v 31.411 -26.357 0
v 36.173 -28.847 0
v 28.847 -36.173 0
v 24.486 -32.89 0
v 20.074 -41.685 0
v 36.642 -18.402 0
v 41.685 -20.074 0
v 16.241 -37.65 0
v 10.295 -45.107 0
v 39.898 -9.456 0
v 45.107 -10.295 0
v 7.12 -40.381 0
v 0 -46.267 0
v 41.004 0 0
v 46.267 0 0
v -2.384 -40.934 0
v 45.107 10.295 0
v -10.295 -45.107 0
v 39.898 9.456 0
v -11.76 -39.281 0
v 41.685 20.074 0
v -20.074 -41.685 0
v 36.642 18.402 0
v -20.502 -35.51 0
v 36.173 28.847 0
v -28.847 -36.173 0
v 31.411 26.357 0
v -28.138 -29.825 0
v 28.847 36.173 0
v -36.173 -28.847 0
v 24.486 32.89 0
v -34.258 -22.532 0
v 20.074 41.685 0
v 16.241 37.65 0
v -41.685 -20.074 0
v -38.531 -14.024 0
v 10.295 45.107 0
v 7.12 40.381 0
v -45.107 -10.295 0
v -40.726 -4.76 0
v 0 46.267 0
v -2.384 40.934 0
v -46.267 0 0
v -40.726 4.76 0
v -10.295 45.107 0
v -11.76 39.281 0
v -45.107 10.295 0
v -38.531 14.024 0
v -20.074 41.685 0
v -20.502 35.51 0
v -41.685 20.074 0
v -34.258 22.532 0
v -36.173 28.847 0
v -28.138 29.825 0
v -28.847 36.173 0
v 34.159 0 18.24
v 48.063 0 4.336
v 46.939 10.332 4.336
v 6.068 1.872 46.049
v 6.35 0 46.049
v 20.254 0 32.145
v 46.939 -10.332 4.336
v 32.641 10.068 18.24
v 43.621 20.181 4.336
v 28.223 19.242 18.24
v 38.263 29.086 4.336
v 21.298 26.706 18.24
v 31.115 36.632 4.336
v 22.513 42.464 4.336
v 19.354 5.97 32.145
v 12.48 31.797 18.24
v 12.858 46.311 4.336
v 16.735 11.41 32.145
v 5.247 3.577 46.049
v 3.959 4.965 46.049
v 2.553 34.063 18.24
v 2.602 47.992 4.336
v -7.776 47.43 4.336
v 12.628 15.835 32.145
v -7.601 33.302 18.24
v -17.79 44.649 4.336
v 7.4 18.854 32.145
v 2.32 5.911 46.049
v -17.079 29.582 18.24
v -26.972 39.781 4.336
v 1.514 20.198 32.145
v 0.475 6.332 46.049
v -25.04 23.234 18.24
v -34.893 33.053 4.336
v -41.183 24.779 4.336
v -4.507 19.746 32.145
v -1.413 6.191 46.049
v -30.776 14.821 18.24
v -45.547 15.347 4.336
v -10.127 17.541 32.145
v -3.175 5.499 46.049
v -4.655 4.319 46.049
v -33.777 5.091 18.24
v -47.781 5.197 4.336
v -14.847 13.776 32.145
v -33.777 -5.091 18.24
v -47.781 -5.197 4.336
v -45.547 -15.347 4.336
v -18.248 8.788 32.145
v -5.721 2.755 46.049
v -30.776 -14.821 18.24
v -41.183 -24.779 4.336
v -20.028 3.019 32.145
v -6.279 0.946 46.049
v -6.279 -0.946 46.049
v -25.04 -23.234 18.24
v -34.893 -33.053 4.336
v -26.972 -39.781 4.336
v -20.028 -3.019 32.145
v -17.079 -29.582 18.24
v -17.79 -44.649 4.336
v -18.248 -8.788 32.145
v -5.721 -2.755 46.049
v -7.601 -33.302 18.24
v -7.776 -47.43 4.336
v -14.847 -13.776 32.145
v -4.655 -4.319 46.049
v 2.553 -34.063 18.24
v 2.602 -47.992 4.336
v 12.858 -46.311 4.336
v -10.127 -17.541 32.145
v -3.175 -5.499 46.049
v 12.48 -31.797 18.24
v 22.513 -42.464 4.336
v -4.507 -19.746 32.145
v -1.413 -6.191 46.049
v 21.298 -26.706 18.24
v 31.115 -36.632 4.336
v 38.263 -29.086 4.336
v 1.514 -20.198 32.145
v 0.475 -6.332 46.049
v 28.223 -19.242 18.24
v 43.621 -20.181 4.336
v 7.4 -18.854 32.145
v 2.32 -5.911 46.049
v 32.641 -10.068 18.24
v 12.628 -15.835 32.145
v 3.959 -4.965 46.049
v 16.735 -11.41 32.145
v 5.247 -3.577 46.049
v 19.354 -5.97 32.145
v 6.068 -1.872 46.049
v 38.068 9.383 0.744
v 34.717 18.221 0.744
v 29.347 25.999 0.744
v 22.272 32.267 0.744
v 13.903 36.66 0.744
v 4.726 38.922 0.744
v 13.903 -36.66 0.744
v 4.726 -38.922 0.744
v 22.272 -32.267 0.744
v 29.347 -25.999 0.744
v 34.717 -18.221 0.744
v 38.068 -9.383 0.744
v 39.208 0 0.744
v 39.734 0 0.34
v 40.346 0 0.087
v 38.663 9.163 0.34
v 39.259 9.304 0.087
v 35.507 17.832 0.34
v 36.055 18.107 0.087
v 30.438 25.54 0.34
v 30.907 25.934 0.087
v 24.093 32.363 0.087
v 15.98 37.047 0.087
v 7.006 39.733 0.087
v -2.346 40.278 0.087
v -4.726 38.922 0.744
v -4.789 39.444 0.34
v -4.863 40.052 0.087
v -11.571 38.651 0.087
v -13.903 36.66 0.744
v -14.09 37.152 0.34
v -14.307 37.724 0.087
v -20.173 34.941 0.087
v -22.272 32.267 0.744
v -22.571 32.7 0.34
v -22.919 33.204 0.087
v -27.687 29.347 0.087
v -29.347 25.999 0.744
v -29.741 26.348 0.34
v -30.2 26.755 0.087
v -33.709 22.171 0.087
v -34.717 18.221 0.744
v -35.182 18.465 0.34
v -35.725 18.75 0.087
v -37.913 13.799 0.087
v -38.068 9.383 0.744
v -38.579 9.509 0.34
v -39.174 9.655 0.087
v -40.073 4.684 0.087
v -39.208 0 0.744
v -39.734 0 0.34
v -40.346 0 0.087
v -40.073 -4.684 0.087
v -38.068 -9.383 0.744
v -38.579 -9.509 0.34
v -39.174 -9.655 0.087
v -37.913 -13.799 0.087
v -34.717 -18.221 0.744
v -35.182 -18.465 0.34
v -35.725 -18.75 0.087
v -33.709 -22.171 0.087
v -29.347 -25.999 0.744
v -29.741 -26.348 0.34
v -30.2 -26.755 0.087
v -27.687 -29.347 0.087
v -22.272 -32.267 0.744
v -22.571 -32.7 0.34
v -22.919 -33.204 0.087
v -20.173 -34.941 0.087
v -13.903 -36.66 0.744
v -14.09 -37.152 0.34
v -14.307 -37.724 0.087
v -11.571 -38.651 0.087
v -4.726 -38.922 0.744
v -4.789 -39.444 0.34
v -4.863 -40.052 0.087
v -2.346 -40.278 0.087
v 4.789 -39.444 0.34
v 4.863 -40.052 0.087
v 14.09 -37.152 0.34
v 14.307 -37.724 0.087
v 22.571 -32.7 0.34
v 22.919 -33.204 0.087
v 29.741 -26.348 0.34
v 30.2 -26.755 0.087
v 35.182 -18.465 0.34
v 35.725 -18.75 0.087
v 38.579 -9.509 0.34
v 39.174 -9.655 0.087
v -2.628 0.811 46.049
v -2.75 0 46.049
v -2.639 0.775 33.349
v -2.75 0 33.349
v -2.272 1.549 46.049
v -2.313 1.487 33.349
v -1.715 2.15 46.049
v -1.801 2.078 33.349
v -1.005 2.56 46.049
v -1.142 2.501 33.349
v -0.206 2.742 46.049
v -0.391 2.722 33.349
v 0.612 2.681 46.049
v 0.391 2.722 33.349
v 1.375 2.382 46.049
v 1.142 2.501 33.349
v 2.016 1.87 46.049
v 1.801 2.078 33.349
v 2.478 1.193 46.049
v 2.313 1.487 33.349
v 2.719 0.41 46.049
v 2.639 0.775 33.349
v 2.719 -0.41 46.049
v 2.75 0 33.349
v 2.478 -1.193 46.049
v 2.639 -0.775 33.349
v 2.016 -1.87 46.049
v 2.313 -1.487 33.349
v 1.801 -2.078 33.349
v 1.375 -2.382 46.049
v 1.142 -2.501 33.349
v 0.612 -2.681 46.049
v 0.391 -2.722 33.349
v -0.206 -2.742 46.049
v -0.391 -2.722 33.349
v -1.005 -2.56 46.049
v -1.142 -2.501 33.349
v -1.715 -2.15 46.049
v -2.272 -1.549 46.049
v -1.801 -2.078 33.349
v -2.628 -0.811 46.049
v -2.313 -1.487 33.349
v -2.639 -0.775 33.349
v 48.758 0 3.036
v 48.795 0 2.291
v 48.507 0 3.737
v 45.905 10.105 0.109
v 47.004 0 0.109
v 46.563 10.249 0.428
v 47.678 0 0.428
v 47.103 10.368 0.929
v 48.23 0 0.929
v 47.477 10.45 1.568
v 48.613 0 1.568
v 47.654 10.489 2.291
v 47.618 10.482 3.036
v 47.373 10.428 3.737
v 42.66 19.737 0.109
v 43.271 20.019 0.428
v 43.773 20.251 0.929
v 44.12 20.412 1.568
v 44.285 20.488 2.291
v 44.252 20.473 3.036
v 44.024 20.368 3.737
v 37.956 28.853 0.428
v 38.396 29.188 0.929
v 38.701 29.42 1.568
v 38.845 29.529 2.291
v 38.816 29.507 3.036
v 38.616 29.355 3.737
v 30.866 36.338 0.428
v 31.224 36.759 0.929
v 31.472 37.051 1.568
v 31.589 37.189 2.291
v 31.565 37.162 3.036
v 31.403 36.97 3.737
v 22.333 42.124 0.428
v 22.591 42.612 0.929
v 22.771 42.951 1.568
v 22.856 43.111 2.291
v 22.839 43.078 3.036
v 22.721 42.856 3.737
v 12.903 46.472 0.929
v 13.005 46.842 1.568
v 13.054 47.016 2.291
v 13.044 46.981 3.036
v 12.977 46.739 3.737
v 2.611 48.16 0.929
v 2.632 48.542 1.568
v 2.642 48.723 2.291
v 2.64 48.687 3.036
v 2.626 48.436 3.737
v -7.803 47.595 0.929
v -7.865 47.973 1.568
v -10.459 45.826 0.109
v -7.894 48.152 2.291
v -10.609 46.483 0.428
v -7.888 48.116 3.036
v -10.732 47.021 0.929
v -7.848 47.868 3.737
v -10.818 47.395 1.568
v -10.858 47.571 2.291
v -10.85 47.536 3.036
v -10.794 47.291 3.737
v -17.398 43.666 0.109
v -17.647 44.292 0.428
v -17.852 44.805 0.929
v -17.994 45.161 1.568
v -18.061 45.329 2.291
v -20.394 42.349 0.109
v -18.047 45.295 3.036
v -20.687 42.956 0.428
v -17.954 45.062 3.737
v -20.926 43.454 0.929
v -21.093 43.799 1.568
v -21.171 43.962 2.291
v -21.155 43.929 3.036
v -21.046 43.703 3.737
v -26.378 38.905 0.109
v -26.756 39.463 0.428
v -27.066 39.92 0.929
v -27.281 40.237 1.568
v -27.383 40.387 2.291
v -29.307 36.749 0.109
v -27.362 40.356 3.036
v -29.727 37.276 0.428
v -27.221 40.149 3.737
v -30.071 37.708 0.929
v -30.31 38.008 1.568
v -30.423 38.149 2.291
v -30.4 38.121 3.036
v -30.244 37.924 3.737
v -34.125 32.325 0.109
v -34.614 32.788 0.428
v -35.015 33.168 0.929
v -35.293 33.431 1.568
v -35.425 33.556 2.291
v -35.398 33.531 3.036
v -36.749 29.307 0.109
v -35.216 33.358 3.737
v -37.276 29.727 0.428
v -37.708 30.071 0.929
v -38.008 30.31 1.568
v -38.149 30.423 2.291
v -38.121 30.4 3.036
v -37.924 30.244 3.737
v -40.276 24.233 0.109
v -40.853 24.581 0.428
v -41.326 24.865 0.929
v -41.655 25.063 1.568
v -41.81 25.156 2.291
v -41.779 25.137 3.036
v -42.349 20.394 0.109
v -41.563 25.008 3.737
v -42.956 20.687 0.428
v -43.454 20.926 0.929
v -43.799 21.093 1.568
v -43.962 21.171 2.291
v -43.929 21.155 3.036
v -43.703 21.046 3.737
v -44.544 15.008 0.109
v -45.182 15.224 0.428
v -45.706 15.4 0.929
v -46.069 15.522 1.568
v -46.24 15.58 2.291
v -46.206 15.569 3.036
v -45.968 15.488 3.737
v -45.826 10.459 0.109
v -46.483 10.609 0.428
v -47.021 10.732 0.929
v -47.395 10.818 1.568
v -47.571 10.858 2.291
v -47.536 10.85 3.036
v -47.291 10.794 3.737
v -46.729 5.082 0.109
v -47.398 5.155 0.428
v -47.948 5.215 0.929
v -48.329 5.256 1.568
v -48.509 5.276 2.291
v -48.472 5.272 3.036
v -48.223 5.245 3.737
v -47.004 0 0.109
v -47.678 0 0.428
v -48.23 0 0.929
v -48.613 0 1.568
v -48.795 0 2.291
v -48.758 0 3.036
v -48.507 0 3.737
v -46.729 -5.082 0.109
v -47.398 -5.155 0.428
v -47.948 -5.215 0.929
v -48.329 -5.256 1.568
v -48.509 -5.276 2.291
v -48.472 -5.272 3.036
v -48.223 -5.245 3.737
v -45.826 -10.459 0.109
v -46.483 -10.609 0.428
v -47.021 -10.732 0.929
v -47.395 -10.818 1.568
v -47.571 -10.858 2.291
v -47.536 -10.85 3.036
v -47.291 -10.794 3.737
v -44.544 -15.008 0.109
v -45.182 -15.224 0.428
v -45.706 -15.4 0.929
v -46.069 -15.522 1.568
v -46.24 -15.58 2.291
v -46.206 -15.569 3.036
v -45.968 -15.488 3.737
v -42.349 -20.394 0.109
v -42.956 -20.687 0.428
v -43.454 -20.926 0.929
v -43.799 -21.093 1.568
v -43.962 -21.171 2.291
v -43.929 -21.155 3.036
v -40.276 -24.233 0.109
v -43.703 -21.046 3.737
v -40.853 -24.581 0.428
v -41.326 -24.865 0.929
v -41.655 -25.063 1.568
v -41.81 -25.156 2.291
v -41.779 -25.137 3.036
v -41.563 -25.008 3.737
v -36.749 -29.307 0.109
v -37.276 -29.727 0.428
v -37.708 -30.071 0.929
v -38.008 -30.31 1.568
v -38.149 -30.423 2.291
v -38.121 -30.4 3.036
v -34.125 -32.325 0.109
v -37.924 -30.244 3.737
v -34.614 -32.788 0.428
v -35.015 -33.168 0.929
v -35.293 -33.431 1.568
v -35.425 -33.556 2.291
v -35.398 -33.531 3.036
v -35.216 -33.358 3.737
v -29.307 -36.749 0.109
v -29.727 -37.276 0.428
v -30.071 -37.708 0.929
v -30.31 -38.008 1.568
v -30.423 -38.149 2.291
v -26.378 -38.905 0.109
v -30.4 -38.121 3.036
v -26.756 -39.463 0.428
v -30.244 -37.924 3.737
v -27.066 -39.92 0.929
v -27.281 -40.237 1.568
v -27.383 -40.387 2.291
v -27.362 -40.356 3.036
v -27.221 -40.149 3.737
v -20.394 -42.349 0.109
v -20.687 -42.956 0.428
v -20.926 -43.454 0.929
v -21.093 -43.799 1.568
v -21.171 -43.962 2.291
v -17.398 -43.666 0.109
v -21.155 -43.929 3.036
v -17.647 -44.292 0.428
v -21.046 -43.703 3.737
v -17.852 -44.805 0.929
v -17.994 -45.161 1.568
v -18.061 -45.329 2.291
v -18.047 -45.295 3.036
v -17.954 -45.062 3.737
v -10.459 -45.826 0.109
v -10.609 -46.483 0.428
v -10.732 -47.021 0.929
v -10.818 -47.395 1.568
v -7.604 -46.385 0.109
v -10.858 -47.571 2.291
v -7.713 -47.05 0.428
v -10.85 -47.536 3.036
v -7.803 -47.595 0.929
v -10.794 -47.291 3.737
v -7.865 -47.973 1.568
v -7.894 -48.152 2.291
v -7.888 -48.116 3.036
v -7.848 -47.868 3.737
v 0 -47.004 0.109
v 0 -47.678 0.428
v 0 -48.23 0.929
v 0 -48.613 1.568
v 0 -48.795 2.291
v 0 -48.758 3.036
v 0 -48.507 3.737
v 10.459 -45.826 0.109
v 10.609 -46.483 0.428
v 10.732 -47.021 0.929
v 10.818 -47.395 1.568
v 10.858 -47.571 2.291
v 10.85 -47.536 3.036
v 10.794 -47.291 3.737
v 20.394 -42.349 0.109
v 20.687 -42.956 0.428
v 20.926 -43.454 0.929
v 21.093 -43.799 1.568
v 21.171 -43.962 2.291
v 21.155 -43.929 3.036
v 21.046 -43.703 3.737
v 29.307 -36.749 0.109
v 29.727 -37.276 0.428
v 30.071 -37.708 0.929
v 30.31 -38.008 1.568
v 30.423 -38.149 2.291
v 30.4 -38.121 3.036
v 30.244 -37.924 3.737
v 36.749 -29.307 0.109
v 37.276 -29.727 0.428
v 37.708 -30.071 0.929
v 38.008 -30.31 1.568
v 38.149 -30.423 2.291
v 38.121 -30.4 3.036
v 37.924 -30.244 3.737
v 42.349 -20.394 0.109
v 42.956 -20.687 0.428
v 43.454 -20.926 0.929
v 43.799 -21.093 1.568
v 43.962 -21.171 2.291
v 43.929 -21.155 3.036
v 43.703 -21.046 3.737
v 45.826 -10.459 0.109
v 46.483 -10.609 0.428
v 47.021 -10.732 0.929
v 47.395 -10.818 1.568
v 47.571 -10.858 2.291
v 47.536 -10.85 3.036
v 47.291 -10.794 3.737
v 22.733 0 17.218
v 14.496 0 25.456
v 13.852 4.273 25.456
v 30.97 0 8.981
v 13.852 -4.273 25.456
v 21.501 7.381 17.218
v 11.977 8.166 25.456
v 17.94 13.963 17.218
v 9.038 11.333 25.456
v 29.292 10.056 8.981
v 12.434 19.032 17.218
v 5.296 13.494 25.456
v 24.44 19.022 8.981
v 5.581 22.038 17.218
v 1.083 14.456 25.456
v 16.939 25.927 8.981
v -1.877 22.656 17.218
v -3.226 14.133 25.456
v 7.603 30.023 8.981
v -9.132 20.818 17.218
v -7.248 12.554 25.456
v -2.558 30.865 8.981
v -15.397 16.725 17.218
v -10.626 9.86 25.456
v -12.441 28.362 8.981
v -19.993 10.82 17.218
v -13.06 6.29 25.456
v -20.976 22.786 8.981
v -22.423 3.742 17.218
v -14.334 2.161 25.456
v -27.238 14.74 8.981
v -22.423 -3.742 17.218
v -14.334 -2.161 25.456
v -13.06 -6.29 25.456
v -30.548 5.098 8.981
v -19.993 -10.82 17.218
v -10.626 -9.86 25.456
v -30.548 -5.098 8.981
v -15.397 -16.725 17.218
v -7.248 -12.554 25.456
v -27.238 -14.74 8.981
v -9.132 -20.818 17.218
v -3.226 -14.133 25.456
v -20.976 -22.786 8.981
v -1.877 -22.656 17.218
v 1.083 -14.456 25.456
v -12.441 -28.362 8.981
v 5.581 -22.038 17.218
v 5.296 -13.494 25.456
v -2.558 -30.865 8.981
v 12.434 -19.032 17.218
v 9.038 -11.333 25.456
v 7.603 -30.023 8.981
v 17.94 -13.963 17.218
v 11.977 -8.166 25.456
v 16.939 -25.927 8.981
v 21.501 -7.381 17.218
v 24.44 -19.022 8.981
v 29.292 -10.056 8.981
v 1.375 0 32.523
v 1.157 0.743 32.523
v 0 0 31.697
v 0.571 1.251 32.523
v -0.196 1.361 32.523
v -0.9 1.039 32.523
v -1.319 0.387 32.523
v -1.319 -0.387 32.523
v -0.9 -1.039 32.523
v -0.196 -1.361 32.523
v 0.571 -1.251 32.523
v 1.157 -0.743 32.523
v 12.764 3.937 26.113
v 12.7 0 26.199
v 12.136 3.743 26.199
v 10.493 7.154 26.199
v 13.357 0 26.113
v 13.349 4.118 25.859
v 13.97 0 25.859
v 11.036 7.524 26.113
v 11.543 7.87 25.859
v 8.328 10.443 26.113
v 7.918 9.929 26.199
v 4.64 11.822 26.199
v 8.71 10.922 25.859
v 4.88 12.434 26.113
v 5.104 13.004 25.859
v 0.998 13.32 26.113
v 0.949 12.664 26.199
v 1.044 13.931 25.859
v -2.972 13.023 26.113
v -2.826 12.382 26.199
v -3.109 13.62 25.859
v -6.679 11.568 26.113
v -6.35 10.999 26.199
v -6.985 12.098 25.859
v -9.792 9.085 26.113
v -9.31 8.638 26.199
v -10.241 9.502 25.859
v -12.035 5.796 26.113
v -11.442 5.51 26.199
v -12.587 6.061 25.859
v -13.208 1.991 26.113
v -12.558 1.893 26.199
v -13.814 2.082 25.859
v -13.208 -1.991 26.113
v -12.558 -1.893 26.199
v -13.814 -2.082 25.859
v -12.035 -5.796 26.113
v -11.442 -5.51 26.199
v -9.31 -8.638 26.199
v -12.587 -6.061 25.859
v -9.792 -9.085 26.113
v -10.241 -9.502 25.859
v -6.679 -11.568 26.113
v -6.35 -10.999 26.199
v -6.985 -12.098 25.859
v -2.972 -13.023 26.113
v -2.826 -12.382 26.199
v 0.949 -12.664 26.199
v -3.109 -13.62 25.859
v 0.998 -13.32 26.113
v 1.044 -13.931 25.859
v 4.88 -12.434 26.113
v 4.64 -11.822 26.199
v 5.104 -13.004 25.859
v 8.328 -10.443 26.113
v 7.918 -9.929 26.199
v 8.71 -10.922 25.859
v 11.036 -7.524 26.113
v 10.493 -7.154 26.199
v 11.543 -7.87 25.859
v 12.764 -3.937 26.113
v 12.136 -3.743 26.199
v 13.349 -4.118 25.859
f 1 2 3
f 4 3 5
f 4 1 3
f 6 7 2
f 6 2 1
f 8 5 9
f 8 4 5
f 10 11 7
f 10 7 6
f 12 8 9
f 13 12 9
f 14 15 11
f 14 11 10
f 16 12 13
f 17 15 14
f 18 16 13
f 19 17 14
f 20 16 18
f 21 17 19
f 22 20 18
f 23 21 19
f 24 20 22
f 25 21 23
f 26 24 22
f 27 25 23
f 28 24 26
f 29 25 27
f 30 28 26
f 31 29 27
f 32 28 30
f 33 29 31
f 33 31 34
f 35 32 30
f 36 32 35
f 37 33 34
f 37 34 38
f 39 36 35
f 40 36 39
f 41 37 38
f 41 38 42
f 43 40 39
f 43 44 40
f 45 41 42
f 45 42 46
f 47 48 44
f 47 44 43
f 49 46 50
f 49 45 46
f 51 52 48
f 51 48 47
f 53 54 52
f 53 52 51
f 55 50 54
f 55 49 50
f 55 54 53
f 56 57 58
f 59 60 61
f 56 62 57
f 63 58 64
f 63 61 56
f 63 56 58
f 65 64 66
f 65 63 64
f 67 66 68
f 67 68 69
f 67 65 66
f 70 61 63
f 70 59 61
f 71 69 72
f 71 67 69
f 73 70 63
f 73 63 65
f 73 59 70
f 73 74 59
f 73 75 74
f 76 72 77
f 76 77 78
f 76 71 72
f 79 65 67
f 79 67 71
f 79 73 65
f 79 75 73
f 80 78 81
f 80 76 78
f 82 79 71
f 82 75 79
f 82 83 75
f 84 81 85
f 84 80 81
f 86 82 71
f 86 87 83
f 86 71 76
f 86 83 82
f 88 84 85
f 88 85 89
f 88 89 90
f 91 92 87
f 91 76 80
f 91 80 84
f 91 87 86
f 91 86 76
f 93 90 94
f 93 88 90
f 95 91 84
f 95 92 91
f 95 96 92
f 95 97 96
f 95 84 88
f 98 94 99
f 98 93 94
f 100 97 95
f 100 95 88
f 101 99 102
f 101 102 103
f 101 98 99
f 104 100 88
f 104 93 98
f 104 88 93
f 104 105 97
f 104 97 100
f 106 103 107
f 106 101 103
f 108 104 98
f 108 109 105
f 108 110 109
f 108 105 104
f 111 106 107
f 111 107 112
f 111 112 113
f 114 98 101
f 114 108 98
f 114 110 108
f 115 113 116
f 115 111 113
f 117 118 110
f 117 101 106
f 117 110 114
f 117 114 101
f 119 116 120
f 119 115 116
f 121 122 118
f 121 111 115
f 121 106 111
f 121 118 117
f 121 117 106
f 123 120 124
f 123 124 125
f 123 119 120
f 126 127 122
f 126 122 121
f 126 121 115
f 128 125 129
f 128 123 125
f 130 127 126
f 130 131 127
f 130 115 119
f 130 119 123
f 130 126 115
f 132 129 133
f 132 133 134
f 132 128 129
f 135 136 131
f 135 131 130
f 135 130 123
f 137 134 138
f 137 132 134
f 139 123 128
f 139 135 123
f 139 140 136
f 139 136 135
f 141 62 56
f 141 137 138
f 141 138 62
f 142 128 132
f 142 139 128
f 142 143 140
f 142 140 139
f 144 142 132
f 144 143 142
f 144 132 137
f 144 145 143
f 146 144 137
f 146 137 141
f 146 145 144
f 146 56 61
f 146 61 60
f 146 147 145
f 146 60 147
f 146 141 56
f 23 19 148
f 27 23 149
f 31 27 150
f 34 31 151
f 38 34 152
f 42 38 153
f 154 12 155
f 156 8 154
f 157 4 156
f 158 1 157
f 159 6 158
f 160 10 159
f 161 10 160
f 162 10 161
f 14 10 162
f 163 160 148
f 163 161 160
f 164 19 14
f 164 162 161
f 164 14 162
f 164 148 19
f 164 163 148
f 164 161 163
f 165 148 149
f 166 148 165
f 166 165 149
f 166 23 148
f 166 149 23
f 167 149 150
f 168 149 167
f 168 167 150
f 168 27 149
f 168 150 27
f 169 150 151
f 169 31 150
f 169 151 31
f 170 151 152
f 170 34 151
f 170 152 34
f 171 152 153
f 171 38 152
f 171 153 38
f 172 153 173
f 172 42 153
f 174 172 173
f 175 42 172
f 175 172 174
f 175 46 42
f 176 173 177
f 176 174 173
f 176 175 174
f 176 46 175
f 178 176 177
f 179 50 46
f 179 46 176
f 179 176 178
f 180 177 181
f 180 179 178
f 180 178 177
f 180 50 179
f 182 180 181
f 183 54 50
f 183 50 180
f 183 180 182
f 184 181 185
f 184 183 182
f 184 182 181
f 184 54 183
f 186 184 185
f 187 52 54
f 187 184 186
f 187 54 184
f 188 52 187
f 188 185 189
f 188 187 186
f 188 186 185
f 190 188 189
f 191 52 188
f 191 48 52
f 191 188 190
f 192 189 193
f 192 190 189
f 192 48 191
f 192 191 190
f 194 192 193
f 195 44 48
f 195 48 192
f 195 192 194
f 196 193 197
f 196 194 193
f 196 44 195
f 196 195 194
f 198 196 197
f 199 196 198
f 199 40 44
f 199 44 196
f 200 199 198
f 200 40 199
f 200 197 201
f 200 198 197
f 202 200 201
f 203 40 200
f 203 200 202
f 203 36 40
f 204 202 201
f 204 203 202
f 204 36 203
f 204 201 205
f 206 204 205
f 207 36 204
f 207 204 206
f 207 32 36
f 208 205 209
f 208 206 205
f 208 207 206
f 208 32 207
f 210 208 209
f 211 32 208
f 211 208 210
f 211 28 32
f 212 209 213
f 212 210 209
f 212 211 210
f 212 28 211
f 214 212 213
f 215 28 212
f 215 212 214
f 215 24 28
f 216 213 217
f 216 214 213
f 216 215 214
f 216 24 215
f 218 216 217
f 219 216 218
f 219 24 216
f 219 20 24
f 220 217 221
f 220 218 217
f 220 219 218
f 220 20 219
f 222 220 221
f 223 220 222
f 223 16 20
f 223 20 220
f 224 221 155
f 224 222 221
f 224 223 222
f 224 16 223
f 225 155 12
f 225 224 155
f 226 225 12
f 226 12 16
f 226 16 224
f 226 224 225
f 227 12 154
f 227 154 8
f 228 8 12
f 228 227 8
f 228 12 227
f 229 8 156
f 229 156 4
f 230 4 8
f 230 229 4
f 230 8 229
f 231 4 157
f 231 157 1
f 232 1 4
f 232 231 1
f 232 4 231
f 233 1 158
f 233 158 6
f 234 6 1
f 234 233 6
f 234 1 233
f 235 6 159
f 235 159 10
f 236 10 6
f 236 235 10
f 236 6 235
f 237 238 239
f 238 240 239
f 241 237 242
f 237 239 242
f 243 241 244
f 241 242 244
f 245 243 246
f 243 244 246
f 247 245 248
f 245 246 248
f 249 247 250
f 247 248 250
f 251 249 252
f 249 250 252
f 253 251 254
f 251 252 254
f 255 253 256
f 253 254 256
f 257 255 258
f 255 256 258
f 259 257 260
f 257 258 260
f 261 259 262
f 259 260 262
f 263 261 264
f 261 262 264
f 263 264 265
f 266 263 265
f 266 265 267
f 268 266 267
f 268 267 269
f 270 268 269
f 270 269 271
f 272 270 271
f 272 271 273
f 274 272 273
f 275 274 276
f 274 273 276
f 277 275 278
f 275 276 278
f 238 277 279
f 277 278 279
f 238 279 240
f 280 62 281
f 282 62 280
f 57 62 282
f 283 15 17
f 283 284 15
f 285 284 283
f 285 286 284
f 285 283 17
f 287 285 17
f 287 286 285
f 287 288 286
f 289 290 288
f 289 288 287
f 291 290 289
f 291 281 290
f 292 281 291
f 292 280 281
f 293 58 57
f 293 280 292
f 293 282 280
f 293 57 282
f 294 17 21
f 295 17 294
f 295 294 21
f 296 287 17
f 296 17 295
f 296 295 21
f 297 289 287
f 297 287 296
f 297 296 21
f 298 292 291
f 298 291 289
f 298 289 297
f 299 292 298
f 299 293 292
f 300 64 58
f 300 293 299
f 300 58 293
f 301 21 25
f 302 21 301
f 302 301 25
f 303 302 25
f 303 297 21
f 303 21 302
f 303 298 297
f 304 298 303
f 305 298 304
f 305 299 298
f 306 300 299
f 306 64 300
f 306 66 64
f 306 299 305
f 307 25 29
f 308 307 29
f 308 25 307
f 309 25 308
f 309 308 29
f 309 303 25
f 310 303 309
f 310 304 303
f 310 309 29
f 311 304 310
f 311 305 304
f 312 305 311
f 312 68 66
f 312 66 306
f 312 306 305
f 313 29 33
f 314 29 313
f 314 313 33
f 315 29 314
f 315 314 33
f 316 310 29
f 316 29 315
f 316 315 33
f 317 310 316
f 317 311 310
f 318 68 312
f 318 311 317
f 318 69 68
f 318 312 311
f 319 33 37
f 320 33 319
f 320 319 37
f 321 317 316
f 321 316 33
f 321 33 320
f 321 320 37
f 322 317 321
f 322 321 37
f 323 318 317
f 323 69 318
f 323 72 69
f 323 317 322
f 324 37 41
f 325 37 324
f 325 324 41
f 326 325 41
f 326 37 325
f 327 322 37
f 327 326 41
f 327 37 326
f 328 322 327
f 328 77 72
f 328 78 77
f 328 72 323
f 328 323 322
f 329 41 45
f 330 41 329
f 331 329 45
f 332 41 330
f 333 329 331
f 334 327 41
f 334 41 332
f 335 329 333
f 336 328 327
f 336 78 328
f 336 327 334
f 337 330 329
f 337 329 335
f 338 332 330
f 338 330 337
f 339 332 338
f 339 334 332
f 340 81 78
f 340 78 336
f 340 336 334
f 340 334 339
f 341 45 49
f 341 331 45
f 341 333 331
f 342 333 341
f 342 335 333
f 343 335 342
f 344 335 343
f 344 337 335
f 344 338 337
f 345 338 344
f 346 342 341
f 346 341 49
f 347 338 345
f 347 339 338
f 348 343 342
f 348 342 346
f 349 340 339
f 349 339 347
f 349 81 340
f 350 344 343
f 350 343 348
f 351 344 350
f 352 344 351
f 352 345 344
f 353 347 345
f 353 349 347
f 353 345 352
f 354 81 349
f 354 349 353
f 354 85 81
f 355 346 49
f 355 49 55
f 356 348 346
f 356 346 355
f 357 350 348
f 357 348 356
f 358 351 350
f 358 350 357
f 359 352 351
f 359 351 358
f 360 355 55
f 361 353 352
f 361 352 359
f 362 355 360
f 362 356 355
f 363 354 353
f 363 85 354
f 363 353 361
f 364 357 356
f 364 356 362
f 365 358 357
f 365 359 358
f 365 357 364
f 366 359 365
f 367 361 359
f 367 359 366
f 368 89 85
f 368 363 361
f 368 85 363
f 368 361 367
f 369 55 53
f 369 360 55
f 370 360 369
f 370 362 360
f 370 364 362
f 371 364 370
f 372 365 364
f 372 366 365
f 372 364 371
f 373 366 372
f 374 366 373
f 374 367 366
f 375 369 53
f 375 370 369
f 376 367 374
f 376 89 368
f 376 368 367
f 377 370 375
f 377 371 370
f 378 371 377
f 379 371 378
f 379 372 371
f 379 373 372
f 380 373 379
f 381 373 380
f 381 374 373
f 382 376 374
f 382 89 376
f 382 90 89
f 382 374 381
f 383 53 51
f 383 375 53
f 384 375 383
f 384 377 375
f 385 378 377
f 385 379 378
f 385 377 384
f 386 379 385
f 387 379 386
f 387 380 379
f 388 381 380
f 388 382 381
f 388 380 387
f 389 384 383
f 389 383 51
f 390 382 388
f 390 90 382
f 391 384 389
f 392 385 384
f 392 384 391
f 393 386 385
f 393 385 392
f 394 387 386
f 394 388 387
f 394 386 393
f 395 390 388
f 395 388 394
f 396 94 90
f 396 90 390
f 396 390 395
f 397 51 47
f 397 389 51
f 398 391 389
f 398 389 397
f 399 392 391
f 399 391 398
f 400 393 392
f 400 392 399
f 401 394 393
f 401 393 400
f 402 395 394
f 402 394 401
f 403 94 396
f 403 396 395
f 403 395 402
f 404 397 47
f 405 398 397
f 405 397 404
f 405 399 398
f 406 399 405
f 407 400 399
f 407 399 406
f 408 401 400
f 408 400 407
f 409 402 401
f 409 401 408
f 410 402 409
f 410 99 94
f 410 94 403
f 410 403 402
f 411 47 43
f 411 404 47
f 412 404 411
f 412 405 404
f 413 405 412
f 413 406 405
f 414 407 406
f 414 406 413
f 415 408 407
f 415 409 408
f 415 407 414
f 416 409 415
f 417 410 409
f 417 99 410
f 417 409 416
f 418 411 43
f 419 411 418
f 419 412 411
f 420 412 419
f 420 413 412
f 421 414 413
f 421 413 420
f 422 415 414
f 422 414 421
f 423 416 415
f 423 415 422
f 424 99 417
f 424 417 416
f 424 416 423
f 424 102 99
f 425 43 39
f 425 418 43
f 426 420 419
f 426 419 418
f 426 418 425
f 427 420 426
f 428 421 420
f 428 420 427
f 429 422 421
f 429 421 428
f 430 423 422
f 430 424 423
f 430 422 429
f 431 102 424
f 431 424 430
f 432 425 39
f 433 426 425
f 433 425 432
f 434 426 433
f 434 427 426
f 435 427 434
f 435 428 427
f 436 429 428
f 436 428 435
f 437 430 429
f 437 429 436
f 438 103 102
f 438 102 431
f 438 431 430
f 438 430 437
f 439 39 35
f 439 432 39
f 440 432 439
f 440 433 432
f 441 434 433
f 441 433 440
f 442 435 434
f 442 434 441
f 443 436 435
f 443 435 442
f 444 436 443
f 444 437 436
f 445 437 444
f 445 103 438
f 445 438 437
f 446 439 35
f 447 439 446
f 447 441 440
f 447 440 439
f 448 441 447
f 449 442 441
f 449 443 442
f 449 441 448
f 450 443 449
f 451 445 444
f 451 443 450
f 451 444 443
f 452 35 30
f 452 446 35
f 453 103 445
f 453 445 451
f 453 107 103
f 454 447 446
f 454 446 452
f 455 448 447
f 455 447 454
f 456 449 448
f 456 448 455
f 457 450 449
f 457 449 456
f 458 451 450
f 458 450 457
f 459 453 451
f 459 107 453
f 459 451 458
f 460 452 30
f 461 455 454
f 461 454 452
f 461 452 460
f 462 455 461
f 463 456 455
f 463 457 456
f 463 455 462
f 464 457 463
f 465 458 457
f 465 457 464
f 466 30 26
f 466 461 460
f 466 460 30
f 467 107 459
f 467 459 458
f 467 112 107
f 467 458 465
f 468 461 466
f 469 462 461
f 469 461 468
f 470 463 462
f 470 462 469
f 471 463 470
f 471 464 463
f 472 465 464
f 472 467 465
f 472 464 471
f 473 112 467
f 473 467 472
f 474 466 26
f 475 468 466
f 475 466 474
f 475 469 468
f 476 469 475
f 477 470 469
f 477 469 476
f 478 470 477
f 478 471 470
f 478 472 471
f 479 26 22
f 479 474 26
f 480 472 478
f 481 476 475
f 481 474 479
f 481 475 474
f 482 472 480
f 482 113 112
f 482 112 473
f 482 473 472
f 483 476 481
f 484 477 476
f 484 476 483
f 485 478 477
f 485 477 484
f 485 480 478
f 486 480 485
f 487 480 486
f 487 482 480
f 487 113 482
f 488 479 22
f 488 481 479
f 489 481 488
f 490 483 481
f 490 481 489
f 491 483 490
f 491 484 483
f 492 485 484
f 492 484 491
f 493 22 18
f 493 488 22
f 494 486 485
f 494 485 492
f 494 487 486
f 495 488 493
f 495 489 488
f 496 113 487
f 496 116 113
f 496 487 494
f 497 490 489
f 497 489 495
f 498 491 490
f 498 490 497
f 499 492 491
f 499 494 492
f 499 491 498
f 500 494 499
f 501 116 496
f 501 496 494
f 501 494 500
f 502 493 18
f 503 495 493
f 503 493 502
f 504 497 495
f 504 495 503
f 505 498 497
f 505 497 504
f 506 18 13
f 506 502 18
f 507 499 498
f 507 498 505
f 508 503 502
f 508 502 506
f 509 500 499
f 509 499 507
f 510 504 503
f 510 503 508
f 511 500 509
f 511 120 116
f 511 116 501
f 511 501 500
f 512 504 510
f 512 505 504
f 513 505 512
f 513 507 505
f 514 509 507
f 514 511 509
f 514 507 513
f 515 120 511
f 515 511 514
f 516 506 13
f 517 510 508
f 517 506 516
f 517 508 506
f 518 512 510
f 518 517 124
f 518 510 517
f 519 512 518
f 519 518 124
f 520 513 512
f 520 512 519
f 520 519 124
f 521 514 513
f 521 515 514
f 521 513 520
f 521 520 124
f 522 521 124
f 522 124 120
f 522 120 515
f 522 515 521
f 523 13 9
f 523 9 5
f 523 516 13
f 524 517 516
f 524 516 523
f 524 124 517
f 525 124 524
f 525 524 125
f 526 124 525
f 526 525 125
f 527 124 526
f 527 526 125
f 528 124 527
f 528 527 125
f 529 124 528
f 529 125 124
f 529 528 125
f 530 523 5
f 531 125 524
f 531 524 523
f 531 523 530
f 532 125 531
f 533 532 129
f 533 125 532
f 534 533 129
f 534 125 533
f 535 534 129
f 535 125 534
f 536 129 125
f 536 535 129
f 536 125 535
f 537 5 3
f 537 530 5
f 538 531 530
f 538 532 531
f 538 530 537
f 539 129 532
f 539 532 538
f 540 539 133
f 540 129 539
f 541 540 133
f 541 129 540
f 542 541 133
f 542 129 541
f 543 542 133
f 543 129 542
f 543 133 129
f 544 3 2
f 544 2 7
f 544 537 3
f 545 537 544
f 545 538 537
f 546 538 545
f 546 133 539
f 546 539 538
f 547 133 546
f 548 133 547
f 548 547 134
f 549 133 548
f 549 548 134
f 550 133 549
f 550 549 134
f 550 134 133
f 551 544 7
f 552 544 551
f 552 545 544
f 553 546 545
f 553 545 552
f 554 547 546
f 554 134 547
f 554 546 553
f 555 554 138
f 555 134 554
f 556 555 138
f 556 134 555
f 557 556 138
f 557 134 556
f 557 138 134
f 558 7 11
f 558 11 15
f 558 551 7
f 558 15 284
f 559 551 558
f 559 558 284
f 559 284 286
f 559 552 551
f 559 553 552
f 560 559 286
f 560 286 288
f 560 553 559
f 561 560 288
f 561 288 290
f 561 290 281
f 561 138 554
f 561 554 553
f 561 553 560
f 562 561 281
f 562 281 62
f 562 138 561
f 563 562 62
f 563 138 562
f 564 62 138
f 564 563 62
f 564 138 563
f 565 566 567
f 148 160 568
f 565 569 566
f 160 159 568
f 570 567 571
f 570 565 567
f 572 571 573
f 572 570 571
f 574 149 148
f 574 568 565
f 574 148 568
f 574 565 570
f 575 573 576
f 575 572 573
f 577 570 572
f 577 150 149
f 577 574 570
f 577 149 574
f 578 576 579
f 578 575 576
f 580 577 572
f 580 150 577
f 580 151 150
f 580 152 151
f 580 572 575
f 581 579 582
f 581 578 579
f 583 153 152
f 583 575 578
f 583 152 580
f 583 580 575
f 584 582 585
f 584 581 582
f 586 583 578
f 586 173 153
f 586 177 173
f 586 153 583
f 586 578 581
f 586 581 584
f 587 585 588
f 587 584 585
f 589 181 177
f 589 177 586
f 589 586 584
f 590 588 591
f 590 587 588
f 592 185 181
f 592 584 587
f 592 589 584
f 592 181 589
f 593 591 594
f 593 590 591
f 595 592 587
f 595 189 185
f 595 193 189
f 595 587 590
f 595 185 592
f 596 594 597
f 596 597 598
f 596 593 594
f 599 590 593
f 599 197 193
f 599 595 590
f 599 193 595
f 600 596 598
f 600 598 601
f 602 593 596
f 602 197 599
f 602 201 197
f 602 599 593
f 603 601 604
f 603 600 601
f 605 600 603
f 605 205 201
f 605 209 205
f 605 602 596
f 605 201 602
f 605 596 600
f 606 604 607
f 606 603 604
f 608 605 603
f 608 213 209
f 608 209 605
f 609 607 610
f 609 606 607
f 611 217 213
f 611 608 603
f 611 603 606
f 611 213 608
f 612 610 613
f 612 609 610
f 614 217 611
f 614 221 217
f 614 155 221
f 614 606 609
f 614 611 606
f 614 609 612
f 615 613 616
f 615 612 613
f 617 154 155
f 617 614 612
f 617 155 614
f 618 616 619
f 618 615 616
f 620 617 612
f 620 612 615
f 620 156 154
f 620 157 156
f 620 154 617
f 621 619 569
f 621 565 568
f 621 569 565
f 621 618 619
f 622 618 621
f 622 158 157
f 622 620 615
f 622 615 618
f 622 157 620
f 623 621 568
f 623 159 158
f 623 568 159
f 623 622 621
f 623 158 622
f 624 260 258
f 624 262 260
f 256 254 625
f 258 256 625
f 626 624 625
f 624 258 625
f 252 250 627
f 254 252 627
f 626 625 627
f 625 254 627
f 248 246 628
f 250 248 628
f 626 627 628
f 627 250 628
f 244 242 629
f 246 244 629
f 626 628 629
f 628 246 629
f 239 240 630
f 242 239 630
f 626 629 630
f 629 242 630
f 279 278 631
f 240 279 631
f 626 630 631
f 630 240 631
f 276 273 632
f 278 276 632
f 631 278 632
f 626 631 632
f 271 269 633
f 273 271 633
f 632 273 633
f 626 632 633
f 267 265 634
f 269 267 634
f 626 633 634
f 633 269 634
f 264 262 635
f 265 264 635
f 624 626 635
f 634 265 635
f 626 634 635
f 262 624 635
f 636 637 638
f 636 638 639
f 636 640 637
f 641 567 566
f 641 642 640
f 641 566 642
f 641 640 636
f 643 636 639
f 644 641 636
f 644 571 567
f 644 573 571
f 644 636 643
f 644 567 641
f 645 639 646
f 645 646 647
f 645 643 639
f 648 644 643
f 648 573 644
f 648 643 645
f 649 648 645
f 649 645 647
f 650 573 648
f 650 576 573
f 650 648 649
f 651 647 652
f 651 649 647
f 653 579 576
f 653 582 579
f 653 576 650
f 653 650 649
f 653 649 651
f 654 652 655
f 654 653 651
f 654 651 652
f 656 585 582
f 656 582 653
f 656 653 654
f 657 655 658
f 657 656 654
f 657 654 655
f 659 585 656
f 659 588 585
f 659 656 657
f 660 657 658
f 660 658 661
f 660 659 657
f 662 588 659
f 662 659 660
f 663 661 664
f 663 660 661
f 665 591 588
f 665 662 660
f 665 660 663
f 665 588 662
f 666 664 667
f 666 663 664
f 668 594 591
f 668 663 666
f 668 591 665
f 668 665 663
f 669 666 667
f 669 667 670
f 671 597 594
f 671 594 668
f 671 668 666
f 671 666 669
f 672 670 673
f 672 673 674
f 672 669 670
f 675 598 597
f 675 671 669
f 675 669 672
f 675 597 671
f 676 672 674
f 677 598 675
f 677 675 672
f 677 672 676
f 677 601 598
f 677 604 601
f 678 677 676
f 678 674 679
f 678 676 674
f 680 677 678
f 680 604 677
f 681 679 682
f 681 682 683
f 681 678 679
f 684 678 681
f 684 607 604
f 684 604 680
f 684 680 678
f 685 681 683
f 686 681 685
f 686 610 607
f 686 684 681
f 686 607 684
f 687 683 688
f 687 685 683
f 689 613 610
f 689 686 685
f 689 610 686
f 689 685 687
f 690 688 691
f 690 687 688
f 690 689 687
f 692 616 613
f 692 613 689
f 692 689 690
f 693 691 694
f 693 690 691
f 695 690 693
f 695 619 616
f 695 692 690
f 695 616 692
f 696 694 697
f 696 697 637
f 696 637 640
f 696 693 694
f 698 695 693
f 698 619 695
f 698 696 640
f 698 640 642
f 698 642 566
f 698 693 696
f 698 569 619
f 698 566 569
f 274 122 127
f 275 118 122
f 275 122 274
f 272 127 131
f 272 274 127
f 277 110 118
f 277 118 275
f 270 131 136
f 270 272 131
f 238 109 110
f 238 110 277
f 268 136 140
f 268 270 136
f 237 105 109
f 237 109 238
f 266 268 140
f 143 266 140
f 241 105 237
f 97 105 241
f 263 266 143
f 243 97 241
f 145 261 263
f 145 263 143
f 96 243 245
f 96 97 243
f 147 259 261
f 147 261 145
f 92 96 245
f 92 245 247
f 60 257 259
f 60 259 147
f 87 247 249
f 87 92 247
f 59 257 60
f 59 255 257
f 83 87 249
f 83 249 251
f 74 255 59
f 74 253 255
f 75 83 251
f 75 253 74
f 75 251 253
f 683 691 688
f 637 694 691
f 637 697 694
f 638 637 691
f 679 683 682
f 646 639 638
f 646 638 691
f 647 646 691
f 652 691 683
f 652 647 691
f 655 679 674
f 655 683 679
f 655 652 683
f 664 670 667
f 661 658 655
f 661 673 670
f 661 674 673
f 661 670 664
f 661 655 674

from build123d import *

# Parameters (mm, degrees)
F3_D     = 5.5
F3_DEPTH = 12.7
F3_TIP   = 1.6523667023


with BuildPart() as f1:
    # F0 (on Front) → F1 (revolve)
    with BuildSketch(Plane.XZ):
        with BuildLine():
            Line((0, 46.0489243269), (0, 26.1994621634))
            Line((0, 26.1994621634), (12.7, 26.1994621634))
            ThreePointArc((12.7, 26.1994621634), (13.6720159182, 26.006116176), (14.4960512242, 25.4555133877))
            Line((14.4960512242, 25.4555133877), (39.2076158361, 0.7439487758))
            ThreePointArc((39.2076158361, 0.7439487758), (40.0316511421, 0.1933459874), (41.0036670603, 0))
            Line((41.0036670603, 0), (46.2668218785, 0))
            ThreePointArc((46.2668218785, 0), (48.613475891, 1.5679840818), (48.0628731027, 4.3360512242))
            Line((48.0628731027, 4.3360512242), (6.35, 46.0489243269))
            Line((6.35, 46.0489243269), (0, 46.0489243269))
        make_face()
    revolve(axis=Axis((0, 0, 36.1241932452), (0, 0, 1)))

    # F3
    with Locations(Plane.XY.offset(46.0489243269)):
        with Locations((0, 0)):
            Hole(F3_D / 2, depth=F3_DEPTH)
            with Locations((0, 0, -(F3_DEPTH + F3_TIP / 2))):  # 118° drill point
                Cone(0, F3_D / 2, F3_TIP, mode=Mode.SUBTRACT)


solid = f1.part
